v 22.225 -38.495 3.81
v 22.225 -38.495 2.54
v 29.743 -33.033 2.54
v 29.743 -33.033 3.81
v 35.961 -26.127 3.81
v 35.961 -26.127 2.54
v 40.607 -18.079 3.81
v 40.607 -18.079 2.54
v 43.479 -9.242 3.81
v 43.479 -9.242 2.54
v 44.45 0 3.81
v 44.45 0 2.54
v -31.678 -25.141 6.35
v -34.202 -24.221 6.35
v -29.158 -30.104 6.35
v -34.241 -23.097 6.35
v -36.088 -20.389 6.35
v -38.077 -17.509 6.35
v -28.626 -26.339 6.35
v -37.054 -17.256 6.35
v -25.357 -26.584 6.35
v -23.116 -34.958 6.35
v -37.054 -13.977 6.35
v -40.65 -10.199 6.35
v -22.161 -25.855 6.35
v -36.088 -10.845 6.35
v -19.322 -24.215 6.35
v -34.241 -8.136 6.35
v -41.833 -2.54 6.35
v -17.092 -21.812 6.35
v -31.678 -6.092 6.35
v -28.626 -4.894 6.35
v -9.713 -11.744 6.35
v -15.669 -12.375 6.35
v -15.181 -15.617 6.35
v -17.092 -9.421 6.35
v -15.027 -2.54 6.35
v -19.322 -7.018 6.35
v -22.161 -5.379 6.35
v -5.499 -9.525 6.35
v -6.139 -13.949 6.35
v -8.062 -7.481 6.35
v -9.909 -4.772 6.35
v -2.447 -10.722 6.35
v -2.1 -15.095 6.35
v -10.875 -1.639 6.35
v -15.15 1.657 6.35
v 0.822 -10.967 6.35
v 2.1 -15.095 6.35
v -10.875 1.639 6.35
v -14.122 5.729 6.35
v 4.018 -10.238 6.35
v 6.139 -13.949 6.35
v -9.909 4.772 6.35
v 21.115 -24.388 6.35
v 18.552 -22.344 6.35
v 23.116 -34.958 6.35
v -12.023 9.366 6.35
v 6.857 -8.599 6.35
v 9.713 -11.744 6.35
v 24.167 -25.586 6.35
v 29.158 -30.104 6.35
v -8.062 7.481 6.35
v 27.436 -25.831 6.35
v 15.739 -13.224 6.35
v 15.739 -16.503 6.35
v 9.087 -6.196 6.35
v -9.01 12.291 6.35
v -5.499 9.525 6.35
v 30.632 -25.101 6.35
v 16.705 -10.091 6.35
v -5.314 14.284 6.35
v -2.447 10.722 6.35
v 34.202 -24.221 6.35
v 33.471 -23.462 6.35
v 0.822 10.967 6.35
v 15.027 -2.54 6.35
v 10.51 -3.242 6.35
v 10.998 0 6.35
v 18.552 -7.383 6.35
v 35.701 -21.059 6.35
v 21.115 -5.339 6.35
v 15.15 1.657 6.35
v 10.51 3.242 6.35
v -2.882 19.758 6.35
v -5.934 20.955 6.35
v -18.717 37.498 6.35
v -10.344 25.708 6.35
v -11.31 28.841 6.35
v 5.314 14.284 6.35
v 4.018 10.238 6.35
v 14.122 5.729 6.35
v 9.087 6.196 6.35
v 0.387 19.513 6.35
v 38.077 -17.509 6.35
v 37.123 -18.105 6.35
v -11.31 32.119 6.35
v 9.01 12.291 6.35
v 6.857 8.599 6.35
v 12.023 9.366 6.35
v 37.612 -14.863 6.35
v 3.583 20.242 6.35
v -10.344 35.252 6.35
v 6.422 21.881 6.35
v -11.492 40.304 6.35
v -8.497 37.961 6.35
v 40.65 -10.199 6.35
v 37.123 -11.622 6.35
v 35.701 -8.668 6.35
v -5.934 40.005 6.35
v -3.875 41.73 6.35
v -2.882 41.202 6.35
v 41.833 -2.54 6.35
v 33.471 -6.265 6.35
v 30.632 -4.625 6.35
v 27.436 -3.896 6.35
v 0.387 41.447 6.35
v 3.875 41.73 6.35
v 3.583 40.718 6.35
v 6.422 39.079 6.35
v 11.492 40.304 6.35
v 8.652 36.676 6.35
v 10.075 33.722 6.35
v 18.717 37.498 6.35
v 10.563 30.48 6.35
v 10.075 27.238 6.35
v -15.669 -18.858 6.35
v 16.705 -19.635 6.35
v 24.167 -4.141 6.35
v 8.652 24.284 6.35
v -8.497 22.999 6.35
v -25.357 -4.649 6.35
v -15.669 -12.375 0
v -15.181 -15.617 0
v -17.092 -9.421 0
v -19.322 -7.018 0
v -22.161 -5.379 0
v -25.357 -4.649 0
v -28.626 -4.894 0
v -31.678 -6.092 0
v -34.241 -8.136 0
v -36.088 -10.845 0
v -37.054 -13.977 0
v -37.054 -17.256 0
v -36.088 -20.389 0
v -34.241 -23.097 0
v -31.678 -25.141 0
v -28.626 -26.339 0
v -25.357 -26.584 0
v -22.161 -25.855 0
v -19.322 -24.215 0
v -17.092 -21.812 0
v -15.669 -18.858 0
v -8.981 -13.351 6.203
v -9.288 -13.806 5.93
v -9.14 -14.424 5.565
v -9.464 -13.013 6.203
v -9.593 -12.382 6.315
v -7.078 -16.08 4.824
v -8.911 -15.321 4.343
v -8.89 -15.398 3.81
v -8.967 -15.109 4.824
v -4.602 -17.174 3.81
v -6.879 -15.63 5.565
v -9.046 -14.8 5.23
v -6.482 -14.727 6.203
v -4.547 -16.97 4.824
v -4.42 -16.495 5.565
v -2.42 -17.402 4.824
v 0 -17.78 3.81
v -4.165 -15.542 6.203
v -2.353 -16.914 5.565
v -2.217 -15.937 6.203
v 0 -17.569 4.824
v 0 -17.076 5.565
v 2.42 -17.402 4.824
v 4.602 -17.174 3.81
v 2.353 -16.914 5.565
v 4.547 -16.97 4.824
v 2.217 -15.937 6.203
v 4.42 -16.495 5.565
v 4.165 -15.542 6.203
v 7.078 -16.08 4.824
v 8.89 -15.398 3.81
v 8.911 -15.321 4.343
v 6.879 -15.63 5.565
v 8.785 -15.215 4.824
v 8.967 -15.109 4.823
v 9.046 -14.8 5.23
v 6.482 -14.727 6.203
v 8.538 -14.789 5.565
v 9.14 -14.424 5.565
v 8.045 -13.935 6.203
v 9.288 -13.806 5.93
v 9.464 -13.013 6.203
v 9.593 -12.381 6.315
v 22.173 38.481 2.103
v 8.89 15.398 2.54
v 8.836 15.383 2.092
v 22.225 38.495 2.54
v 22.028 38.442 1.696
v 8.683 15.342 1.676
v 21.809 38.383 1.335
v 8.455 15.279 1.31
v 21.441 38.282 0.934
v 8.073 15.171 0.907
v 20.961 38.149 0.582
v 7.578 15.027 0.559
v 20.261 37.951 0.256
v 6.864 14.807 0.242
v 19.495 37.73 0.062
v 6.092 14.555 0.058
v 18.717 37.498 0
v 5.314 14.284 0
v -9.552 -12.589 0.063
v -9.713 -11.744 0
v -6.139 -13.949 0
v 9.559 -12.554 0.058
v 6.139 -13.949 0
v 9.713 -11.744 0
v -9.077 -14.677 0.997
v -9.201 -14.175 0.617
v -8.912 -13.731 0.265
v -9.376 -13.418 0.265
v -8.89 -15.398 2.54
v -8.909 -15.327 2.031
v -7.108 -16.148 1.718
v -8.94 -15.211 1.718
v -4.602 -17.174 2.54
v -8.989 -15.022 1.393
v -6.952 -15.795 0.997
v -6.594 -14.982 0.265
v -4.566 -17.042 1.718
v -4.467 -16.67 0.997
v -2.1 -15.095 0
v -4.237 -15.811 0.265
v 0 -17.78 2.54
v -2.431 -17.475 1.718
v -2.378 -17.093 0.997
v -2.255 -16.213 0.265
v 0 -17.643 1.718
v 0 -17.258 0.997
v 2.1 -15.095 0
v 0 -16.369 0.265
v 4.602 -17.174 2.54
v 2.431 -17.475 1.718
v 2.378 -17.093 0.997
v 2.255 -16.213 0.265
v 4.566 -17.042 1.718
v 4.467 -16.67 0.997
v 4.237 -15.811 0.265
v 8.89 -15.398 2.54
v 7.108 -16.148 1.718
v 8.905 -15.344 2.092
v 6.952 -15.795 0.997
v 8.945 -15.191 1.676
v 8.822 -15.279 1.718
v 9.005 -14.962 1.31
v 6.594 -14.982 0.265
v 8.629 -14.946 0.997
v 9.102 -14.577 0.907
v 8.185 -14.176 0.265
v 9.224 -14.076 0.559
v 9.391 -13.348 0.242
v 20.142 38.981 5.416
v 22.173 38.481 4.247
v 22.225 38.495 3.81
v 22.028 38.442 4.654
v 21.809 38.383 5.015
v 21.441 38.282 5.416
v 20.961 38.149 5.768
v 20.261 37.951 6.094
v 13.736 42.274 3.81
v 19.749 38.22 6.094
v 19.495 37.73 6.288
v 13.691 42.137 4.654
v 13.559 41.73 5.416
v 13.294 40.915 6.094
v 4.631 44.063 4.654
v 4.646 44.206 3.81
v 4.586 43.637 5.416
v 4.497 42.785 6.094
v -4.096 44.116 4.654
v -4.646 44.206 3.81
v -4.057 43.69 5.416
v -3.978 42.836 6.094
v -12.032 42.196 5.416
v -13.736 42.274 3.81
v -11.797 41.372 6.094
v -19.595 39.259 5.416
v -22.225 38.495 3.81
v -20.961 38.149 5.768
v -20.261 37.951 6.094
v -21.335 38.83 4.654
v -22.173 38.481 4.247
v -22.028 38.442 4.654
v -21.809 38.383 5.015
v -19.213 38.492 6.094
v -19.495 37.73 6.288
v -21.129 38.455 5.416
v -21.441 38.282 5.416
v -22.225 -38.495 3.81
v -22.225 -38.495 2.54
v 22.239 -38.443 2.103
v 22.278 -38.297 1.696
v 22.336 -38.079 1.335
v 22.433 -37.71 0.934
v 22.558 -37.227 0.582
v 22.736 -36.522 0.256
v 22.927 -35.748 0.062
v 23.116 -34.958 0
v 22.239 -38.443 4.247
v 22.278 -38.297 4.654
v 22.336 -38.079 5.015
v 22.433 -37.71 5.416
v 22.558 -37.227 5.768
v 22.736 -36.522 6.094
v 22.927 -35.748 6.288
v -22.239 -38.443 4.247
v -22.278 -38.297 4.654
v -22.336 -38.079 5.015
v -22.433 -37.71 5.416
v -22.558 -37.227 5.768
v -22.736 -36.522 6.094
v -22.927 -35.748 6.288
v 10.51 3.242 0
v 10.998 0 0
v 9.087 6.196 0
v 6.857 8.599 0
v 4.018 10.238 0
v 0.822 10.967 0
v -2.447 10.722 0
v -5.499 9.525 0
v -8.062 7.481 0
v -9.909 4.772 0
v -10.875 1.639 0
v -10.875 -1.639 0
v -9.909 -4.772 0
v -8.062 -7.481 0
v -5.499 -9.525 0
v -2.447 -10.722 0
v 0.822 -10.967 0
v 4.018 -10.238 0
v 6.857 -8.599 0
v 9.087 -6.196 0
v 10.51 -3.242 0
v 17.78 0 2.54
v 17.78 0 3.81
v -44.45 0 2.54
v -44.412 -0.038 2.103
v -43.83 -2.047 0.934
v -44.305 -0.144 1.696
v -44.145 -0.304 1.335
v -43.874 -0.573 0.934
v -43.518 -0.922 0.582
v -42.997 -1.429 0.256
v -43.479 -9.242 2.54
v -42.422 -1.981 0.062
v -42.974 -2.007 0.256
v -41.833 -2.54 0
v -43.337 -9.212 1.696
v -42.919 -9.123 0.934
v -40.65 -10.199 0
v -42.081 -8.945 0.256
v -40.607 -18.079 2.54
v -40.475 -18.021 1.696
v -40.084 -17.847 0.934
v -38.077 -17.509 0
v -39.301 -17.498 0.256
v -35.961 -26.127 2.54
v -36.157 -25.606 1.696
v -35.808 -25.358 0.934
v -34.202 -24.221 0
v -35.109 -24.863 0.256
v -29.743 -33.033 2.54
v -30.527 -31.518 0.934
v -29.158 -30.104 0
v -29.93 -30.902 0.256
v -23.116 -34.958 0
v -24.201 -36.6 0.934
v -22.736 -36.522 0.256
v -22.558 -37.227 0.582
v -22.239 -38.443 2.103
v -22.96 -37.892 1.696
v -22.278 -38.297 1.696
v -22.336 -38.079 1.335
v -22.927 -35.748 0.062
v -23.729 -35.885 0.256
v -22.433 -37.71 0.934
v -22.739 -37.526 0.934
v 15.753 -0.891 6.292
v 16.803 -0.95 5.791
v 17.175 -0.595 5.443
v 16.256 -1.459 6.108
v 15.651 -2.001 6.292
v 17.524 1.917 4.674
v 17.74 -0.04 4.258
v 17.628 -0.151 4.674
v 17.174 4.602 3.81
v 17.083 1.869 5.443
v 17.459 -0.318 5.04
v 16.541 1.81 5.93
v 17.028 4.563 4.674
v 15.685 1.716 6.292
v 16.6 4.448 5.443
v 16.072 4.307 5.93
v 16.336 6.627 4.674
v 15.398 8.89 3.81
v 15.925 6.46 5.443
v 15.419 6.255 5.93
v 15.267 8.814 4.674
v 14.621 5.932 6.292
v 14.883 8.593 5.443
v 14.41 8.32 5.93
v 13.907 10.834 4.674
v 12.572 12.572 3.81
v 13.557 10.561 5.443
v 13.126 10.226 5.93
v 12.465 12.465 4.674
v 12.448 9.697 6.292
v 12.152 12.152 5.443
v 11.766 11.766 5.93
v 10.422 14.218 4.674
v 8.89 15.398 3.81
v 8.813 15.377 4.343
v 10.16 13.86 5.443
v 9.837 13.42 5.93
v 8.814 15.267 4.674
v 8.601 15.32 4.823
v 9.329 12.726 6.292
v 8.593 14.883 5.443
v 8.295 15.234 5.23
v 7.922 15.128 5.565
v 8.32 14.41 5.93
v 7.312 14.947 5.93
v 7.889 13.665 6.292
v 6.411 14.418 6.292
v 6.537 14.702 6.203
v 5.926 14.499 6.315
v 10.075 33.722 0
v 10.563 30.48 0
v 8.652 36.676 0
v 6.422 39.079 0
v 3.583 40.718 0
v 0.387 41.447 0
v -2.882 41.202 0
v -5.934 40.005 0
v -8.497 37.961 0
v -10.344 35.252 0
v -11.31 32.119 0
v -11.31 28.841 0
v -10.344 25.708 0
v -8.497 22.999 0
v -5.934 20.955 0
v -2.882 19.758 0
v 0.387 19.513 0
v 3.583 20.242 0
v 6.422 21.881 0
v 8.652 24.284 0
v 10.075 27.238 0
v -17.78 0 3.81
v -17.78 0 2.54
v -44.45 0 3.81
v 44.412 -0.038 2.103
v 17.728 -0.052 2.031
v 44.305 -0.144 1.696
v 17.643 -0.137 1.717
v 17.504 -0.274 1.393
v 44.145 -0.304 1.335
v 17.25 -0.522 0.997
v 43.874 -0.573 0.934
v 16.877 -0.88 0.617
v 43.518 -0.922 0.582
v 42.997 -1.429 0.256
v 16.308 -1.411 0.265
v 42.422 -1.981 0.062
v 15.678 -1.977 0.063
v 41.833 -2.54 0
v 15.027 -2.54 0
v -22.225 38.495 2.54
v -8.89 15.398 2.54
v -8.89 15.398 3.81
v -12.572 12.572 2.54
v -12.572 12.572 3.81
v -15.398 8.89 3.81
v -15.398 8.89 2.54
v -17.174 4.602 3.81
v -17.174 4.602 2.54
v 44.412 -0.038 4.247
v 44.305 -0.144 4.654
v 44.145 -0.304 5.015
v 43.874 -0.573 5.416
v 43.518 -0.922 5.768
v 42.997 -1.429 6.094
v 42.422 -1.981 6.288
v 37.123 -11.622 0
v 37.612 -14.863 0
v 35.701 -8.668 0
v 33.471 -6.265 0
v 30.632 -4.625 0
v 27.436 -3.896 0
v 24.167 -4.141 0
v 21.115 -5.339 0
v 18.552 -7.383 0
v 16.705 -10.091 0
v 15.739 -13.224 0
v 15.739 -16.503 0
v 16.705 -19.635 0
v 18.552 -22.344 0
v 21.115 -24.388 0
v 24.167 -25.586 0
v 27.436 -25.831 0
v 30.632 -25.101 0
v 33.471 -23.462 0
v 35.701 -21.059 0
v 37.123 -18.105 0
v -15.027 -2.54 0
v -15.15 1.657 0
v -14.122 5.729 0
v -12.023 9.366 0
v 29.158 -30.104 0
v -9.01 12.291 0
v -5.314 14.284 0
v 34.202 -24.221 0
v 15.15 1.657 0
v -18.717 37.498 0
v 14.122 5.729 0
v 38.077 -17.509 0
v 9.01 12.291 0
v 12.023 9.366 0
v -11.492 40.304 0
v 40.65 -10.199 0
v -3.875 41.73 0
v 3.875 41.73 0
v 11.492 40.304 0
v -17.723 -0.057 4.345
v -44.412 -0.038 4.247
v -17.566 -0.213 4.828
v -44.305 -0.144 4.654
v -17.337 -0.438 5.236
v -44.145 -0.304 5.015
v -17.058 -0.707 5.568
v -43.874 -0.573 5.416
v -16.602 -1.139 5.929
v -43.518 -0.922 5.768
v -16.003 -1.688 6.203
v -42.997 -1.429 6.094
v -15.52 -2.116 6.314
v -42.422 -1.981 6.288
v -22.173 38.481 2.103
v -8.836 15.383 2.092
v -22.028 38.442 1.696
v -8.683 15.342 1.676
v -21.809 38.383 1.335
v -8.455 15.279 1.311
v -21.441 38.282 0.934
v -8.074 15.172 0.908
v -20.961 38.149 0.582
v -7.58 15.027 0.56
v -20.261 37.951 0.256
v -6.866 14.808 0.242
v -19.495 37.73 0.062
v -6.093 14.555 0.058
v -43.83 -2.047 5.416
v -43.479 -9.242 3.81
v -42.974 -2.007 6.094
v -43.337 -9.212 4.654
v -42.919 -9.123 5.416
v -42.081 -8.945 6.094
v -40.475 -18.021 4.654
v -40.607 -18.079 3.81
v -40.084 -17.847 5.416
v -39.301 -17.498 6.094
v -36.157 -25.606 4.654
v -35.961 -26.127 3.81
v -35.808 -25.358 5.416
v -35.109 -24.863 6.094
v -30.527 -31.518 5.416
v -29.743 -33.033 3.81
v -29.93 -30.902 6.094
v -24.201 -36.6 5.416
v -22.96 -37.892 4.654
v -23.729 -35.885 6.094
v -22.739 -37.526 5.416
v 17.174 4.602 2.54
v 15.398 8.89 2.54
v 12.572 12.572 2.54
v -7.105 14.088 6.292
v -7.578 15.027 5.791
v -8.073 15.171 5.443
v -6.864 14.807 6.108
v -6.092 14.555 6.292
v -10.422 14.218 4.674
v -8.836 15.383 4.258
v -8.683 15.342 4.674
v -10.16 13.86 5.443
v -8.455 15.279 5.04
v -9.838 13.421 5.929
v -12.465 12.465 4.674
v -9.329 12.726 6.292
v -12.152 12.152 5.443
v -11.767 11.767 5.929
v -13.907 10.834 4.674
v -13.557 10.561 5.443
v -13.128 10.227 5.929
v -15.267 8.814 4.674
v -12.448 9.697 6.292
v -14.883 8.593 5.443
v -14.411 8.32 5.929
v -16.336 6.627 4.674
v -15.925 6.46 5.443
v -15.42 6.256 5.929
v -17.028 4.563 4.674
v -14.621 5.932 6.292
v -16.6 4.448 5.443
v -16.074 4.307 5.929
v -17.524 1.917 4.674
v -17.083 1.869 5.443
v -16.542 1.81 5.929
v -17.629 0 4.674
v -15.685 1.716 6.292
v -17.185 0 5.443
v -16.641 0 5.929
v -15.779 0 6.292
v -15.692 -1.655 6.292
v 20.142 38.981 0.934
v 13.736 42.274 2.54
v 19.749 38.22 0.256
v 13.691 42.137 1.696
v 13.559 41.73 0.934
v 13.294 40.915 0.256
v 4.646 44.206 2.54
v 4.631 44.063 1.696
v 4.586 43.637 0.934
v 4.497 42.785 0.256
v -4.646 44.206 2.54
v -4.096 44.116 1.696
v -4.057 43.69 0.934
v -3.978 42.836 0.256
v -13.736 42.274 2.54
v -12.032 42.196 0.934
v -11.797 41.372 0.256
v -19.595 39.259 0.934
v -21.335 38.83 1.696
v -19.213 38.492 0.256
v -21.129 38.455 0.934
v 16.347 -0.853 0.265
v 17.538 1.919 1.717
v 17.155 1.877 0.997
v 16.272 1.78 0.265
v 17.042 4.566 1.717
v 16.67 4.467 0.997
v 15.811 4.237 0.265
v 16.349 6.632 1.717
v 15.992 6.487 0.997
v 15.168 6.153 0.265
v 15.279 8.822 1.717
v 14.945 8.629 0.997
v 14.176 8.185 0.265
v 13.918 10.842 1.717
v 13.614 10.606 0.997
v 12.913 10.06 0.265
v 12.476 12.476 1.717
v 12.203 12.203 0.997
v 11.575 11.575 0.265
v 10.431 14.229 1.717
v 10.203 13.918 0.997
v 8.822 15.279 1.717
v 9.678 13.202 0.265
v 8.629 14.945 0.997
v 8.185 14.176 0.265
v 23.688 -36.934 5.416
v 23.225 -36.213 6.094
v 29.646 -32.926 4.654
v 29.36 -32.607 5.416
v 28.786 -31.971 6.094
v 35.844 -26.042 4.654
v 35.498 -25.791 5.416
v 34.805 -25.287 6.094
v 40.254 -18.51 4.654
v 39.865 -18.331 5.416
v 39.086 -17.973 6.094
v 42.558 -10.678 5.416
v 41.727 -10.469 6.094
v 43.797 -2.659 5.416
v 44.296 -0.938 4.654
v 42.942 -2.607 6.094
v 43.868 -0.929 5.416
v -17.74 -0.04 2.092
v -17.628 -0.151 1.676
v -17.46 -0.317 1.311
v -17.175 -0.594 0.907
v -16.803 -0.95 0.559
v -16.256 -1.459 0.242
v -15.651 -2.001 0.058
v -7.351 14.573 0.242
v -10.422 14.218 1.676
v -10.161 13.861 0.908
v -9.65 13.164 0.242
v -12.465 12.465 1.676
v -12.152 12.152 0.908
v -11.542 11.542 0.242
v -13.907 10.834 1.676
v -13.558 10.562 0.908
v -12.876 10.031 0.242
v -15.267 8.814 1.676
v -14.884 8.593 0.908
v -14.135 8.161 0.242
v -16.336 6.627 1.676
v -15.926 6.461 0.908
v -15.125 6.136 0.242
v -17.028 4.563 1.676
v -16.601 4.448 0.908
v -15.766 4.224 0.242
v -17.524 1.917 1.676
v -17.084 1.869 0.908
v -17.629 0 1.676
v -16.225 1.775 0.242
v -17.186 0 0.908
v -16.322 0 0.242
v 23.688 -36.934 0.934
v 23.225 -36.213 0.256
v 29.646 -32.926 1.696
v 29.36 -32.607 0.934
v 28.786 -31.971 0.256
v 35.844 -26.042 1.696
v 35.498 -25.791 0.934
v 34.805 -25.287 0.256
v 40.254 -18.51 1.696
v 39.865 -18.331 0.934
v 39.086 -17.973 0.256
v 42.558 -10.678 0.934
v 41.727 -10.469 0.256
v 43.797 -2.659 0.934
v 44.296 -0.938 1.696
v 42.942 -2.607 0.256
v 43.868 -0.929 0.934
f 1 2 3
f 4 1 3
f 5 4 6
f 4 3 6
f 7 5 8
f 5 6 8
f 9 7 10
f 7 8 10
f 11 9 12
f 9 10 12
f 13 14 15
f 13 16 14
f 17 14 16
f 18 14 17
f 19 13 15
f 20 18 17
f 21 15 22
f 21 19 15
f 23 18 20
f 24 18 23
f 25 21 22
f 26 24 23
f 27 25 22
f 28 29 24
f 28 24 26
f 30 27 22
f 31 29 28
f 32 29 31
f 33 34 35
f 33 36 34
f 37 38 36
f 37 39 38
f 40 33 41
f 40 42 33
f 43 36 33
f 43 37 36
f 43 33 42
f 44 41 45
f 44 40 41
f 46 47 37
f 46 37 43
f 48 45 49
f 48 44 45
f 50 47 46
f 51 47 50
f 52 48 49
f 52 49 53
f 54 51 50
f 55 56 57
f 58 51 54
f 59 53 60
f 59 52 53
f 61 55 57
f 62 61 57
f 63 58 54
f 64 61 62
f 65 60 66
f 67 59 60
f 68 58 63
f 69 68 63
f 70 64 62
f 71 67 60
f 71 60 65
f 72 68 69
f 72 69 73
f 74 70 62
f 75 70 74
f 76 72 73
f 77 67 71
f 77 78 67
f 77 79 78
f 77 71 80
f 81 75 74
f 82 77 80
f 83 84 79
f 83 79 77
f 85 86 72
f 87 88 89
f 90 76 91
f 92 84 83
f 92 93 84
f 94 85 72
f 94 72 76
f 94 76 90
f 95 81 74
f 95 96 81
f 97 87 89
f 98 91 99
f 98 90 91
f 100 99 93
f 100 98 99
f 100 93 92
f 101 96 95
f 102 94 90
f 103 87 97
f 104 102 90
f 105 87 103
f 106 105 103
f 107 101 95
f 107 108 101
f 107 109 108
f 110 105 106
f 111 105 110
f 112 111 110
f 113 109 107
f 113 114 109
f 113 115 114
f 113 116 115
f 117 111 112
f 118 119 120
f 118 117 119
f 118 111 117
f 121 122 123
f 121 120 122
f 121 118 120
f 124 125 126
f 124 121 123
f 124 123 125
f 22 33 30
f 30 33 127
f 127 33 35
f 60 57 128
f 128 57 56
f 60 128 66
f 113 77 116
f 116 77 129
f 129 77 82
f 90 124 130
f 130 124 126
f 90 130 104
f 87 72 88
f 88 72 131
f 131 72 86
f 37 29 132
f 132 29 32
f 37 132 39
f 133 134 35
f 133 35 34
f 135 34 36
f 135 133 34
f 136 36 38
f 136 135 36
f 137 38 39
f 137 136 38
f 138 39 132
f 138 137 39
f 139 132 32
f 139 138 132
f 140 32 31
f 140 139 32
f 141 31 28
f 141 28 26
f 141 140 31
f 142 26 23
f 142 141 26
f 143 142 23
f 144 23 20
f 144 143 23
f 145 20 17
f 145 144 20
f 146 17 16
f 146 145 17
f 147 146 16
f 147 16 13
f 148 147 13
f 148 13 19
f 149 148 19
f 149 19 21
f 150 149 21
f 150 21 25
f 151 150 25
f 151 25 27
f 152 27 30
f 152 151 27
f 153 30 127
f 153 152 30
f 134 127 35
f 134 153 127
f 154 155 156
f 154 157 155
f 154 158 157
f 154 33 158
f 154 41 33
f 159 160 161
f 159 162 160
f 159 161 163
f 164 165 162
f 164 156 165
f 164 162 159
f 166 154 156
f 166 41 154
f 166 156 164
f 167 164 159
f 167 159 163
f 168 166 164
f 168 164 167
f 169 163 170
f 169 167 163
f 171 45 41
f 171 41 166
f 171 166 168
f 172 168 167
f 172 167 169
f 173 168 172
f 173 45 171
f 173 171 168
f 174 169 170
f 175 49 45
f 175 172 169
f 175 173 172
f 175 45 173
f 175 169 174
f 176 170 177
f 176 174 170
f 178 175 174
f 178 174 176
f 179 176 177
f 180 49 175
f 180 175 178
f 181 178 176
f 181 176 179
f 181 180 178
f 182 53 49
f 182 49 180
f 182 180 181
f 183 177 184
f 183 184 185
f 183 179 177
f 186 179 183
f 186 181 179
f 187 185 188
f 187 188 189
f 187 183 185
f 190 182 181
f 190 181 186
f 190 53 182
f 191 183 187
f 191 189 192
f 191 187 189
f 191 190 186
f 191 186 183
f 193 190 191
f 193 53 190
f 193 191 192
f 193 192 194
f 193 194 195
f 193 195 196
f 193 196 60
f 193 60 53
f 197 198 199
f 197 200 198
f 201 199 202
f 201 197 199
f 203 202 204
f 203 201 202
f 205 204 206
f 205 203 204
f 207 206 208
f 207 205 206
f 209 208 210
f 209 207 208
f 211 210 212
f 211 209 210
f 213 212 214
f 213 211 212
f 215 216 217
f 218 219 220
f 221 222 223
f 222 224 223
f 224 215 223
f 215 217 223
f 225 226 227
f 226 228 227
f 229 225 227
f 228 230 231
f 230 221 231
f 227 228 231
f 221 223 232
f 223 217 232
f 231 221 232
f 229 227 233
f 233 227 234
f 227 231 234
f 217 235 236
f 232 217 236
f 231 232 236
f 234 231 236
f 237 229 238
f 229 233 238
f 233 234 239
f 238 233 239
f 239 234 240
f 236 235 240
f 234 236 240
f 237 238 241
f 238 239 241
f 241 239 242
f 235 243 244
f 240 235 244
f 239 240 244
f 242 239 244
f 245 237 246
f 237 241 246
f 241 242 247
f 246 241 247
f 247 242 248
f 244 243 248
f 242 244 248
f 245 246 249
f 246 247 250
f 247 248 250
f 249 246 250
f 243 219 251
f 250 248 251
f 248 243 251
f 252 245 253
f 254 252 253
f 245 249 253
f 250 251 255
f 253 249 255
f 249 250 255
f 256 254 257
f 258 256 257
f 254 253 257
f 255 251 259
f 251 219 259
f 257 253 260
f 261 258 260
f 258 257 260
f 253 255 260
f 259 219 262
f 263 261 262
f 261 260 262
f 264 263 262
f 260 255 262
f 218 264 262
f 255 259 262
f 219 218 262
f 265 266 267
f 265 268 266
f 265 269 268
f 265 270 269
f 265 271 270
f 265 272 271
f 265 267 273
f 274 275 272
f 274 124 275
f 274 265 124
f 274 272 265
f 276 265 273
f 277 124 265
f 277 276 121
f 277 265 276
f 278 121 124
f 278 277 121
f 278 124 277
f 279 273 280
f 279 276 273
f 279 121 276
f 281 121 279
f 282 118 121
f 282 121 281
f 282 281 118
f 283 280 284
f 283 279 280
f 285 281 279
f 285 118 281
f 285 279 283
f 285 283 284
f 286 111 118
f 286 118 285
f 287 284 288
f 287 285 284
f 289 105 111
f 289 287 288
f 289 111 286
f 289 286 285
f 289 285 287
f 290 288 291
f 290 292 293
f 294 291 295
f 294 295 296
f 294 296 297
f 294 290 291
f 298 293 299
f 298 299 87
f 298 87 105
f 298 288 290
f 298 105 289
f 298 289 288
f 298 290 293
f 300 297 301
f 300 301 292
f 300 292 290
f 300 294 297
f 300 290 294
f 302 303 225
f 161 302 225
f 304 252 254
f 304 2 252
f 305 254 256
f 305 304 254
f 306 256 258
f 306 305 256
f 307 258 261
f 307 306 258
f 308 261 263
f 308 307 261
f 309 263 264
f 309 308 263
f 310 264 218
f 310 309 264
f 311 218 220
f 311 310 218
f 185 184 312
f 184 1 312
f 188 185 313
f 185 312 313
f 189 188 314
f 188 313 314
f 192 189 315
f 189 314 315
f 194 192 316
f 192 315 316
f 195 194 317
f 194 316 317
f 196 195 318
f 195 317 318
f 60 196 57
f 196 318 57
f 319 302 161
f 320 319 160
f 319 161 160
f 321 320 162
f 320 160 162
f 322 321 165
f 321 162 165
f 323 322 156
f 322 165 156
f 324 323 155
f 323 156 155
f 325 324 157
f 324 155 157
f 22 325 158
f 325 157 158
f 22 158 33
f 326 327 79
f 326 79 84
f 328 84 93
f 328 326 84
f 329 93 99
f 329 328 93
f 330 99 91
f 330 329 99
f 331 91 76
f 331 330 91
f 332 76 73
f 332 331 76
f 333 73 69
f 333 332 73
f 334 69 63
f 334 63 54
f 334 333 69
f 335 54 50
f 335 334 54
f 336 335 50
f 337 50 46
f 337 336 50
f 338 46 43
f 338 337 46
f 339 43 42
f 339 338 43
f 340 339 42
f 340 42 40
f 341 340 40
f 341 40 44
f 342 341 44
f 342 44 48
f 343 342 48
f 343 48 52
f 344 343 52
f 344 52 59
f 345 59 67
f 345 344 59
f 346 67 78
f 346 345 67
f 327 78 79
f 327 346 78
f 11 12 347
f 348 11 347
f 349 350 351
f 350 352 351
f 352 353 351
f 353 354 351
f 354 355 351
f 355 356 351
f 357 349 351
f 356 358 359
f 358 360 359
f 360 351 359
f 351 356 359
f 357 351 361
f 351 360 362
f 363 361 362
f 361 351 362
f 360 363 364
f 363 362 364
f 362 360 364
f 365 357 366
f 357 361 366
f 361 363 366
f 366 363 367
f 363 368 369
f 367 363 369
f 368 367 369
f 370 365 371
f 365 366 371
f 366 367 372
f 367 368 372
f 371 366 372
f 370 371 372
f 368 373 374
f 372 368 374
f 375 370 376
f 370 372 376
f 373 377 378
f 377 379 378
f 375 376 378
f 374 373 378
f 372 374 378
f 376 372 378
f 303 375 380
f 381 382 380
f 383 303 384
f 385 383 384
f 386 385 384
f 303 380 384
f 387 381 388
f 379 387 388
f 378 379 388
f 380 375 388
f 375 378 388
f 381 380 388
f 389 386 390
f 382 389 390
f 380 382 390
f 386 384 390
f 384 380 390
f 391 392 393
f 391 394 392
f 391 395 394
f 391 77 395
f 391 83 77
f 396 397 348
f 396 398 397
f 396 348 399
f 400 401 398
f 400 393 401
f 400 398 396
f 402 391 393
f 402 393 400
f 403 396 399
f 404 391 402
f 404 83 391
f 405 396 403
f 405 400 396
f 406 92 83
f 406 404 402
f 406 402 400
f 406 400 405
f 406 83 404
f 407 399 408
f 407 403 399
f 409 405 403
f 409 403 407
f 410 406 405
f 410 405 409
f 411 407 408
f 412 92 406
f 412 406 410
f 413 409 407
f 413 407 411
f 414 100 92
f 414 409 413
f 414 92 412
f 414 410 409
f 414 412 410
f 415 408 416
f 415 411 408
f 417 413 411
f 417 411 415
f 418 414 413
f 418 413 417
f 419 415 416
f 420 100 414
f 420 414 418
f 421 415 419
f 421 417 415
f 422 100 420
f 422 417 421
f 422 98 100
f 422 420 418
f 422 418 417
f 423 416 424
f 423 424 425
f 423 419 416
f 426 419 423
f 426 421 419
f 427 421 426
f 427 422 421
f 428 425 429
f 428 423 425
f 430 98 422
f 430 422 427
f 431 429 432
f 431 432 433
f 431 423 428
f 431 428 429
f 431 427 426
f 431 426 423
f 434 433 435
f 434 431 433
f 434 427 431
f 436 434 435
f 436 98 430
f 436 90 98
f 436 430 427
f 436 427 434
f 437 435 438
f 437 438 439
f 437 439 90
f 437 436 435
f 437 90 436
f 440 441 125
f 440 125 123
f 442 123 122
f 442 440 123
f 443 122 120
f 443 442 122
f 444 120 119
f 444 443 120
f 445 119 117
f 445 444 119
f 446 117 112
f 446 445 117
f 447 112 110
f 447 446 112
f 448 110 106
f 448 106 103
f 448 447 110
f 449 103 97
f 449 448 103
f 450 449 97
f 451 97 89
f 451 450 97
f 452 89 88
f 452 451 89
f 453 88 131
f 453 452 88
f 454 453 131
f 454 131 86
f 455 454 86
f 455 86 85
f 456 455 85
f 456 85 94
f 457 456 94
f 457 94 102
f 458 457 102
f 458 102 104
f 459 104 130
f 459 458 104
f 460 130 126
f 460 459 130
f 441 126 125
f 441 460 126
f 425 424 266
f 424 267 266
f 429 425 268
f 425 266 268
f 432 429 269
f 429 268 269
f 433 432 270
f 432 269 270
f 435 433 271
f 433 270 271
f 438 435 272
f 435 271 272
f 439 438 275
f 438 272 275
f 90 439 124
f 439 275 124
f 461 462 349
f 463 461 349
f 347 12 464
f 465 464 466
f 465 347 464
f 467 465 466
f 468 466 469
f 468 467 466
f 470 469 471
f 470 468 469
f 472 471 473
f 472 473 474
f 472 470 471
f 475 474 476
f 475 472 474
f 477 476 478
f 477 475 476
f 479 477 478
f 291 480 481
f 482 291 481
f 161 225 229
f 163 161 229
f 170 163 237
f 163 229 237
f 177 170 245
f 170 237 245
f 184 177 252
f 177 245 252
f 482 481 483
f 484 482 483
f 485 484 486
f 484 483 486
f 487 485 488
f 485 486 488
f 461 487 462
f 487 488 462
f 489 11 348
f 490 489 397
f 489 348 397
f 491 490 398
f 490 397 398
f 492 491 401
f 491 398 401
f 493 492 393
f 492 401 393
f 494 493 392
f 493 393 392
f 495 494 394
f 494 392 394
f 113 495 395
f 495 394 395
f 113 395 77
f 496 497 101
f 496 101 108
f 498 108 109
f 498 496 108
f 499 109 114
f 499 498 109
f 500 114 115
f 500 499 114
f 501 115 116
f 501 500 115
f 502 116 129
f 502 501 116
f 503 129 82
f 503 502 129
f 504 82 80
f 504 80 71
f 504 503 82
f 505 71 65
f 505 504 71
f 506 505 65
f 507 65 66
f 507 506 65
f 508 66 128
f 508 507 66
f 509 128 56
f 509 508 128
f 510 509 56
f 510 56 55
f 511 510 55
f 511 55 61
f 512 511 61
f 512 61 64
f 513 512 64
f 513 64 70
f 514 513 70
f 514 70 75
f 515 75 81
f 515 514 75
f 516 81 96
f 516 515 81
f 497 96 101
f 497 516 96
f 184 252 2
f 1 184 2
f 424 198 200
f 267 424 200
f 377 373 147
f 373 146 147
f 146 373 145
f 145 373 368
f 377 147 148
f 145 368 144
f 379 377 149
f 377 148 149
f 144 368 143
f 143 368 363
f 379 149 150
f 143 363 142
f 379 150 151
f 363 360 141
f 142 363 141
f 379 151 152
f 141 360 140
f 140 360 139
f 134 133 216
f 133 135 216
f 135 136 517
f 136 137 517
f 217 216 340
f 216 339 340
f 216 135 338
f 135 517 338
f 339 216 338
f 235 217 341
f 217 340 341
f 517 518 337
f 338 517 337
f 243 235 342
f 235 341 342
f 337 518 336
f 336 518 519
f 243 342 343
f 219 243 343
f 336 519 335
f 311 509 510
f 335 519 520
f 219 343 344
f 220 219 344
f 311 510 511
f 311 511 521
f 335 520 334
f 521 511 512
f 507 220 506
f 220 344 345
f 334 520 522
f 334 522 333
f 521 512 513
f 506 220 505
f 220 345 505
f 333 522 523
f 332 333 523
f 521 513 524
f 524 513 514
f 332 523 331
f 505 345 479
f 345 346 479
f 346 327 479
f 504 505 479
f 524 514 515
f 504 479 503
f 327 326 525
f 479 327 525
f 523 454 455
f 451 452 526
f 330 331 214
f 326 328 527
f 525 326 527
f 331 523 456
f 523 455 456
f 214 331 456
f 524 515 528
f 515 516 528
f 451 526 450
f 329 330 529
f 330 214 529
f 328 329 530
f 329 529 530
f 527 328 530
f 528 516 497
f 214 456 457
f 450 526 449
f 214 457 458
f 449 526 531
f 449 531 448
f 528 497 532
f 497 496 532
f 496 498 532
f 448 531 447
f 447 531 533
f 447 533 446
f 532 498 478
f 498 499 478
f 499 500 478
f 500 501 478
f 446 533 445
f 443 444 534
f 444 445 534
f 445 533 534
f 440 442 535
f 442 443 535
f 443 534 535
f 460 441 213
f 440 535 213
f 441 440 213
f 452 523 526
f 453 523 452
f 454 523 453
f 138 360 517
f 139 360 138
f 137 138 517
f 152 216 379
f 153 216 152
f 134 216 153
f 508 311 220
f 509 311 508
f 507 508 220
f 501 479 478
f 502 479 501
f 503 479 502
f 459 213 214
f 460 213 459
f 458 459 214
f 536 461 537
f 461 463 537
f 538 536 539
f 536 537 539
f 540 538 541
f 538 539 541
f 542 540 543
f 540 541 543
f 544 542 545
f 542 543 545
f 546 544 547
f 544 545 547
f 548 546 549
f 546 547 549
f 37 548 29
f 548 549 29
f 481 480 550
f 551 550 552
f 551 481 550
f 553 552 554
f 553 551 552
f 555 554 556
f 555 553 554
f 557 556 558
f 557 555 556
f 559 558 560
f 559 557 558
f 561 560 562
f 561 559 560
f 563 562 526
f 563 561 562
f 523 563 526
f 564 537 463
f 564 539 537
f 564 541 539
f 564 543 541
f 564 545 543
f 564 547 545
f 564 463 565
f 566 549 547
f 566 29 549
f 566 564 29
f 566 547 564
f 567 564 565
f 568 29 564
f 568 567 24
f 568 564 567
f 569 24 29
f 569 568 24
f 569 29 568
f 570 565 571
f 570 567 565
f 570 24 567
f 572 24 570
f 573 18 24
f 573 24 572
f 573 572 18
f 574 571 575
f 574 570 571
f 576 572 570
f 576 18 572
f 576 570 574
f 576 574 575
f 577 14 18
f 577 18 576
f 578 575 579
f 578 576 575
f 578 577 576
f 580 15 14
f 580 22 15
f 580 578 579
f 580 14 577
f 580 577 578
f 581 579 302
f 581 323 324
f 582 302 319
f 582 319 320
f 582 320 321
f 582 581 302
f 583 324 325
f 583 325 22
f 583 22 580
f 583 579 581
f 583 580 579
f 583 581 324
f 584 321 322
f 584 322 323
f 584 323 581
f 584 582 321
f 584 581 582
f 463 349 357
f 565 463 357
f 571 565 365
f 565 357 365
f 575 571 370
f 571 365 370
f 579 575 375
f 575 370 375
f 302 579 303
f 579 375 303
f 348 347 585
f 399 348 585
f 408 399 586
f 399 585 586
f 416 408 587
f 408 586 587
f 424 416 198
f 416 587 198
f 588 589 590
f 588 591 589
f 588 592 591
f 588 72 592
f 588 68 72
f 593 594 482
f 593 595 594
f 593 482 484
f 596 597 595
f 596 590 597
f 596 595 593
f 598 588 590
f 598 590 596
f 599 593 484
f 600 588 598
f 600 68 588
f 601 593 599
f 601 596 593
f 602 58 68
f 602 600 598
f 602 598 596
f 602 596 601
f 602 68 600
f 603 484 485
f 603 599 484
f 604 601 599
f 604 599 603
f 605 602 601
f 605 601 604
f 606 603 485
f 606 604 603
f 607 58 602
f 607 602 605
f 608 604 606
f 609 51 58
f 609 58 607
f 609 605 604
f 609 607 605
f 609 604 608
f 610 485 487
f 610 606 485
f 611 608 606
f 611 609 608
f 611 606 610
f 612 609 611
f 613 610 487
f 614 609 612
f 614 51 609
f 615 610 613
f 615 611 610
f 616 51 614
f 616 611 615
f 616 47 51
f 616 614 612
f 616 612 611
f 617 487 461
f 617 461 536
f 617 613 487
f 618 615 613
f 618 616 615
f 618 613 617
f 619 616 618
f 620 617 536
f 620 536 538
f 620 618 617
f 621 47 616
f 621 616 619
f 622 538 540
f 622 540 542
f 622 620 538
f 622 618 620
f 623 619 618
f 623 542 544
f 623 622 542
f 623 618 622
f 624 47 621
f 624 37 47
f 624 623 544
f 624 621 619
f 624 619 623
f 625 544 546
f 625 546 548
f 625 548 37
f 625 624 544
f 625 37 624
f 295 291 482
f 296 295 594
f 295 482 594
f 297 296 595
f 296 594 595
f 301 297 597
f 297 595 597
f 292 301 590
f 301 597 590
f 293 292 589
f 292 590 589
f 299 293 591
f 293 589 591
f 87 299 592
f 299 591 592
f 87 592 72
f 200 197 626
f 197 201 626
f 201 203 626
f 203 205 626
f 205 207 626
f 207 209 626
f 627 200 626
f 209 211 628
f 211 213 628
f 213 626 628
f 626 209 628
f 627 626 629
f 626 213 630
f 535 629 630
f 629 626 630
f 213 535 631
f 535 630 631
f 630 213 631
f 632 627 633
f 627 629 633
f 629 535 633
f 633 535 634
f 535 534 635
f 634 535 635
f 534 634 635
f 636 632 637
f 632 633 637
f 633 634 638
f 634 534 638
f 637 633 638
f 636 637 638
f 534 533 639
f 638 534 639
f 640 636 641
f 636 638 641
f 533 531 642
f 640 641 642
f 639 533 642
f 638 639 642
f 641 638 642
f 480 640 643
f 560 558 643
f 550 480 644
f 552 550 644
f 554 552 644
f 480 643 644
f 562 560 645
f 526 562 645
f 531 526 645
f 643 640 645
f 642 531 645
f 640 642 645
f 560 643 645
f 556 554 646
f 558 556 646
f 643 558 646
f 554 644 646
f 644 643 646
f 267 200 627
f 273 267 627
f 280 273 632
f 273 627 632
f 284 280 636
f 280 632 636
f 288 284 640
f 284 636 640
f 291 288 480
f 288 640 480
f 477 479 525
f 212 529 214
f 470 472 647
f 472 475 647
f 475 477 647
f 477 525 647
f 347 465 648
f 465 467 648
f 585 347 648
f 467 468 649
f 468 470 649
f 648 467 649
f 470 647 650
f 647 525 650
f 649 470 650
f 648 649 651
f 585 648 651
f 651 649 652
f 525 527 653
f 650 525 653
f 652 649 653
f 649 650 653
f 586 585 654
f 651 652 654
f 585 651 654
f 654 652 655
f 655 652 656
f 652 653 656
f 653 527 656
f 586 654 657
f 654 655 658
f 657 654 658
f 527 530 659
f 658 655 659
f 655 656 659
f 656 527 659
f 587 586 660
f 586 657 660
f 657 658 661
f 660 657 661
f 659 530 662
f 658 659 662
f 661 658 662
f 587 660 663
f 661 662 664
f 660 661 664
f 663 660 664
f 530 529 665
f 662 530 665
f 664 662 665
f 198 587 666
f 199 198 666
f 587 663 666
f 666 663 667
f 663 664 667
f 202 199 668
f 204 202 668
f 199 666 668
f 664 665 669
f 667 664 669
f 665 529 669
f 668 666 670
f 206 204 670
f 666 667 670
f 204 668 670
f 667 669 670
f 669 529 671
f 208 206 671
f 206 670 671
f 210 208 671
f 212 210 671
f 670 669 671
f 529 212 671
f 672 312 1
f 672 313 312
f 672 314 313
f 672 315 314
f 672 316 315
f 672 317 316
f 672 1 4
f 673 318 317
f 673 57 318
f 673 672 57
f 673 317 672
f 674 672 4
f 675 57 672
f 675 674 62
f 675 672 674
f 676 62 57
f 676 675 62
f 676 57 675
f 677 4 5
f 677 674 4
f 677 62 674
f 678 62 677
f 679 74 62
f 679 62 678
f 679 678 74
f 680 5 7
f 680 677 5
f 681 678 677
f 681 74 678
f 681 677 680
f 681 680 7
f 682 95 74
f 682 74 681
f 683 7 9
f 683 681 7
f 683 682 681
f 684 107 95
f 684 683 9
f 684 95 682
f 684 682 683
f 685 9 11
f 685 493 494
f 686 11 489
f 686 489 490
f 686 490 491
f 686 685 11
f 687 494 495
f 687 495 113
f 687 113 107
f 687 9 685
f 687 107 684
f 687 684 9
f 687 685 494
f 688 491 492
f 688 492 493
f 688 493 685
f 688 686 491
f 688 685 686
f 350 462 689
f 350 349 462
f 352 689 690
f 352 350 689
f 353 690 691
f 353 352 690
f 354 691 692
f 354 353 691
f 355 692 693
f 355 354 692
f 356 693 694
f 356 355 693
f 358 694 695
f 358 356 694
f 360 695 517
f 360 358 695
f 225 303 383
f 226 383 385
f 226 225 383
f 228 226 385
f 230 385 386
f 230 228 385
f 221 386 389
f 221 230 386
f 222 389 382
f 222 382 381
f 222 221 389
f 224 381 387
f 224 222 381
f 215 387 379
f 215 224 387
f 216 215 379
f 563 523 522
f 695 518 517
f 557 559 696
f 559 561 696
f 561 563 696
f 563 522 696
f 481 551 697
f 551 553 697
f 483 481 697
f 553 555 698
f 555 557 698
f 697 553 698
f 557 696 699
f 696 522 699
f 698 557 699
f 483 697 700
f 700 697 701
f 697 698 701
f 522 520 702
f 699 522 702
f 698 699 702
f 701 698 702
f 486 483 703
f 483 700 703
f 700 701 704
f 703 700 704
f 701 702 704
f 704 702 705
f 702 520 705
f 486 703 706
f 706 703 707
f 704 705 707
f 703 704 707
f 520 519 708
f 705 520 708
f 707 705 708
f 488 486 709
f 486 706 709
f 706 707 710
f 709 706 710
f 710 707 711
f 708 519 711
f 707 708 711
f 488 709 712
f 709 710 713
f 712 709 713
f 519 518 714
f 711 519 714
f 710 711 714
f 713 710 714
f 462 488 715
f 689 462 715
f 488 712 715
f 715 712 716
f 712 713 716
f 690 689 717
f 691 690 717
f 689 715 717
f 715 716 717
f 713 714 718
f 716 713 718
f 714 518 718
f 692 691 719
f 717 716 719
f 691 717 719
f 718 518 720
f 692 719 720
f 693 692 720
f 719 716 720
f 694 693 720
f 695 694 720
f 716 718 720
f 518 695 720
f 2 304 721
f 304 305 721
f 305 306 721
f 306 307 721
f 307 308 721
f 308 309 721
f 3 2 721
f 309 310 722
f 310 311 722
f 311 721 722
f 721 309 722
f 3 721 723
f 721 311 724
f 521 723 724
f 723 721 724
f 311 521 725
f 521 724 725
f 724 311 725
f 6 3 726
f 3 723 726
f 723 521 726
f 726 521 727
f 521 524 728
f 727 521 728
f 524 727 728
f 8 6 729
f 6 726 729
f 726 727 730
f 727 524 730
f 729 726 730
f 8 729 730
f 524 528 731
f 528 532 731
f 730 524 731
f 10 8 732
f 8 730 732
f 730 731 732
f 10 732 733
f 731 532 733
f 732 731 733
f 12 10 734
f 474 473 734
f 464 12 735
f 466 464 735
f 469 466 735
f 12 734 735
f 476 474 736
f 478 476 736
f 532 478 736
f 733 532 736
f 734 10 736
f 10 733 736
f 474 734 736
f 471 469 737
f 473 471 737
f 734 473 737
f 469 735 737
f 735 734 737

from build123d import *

# Parameters (mm, degrees)
F0_R     = 10.9982
F1_DEPTH = 6.35
F2_R     = 2.54


with BuildPart() as f1:
    # F0 (on Top) → F1 (new body)
    with BuildSketch(Plane.XY):
        with BuildLine():
            ThreePointArc((-44.45, 0), (-38.4948291982, -22.225), (-22.225, -38.4948291982))
            Line((-22.225, -38.4948291982), (-8.89, -15.3979316793))
            ThreePointArc((-8.89, -15.3979316793), (-15.3979316793, -8.89), (-17.78, 0))
            Line((-17.78, 0), (-44.45, 0))
        make_face()
        with Locations((-26.1790094785, -15.6166254914)):
            Circle(F0_R, mode=Mode.SUBTRACT)
        with BuildLine():
            Line((8.89, 15.3979316793), (22.225, 38.4948291982))
            ThreePointArc((22.225, 38.4948291982), (0, 44.45), (-22.225, 38.4948291982))
            Line((-22.225, 38.4948291982), (-8.89, 15.3979316793))
            ThreePointArc((-8.89, 15.3979316793), (0, 17.78), (8.89, 15.3979316793))
        make_face()
        with Locations((-0.4348896577, 30.48)):
            Circle(F0_R, mode=Mode.SUBTRACT)
        with BuildLine():
            ThreePointArc((22.225, -38.4948291982), (38.4948291982, -22.225), (44.45, 0))
            Line((44.45, 0), (17.78, 0))
            ThreePointArc((17.78, 0), (15.3979316793, -8.89), (8.89, -15.3979316793))
            Line((8.89, -15.3979316793), (22.225, -38.4948291982))
        make_face()
        with Locations((26.6138991362, -14.8633745086)):
            Circle(F0_R, mode=Mode.SUBTRACT)
        with BuildLine():
            ThreePointArc((8.89, -15.3979316793), (15.3979316793, -8.89), (17.78, 0))
            ThreePointArc((17.78, 0), (15.3979316793, 8.89), (8.89, 15.3979316793))
            ThreePointArc((8.89, 15.3979316793), (0, 17.78), (-8.89, 15.3979316793))
            ThreePointArc((-8.89, 15.3979316793), (-15.3979316793, 8.89), (-17.78, 0))
            ThreePointArc((-17.78, 0), (-15.3979316793, -8.89), (-8.89, -15.3979316793))
            ThreePointArc((-8.89, -15.3979316793), (0, -17.78), (8.89, -15.3979316793))
        make_face()
        Circle(F0_R, mode=Mode.SUBTRACT)
    extrude(amount=F1_DEPTH)

    # F2
    f2_edges = [f1.edges().sort_by_distance(p)[0] for p in [
        (-38.494829, -22.225, 6.35),
        (-15.5575, -26.94638, 6.35),
        (0, -17.78, 6.35),
        (15.5575, -26.94638, 6.35),
        (38.494829, -22.225, 6.35),
        (31.115, 0, 6.35),
        (15.397932, 8.89, 6.35),
        (15.5575, 26.94638, 6.35),
        (0, 44.45, 6.35),
        (-15.5575, 26.94638, 6.35),
        (-15.397932, 8.89, 6.35),
        (-31.115, 0, 6.35),
        (-15.5575, 26.94638, 0),
        (0, 44.45, 0),
        (15.5575, 26.94638, 0),
        (38.494829, -22.225, 0),
        (31.115, 0, 0),
        (15.5575, -26.94638, 0),
        (-15.397932, 8.89, 0),
        (15.397932, 8.89, 0),
        (-31.115, 0, 0),
        (-38.494829, -22.225, 0),
        (-15.5575, -26.94638, 0),
        (0, -17.78, 0),
    ]]
    fillet(f2_edges, radius=F2_R)


solid = f1.part
